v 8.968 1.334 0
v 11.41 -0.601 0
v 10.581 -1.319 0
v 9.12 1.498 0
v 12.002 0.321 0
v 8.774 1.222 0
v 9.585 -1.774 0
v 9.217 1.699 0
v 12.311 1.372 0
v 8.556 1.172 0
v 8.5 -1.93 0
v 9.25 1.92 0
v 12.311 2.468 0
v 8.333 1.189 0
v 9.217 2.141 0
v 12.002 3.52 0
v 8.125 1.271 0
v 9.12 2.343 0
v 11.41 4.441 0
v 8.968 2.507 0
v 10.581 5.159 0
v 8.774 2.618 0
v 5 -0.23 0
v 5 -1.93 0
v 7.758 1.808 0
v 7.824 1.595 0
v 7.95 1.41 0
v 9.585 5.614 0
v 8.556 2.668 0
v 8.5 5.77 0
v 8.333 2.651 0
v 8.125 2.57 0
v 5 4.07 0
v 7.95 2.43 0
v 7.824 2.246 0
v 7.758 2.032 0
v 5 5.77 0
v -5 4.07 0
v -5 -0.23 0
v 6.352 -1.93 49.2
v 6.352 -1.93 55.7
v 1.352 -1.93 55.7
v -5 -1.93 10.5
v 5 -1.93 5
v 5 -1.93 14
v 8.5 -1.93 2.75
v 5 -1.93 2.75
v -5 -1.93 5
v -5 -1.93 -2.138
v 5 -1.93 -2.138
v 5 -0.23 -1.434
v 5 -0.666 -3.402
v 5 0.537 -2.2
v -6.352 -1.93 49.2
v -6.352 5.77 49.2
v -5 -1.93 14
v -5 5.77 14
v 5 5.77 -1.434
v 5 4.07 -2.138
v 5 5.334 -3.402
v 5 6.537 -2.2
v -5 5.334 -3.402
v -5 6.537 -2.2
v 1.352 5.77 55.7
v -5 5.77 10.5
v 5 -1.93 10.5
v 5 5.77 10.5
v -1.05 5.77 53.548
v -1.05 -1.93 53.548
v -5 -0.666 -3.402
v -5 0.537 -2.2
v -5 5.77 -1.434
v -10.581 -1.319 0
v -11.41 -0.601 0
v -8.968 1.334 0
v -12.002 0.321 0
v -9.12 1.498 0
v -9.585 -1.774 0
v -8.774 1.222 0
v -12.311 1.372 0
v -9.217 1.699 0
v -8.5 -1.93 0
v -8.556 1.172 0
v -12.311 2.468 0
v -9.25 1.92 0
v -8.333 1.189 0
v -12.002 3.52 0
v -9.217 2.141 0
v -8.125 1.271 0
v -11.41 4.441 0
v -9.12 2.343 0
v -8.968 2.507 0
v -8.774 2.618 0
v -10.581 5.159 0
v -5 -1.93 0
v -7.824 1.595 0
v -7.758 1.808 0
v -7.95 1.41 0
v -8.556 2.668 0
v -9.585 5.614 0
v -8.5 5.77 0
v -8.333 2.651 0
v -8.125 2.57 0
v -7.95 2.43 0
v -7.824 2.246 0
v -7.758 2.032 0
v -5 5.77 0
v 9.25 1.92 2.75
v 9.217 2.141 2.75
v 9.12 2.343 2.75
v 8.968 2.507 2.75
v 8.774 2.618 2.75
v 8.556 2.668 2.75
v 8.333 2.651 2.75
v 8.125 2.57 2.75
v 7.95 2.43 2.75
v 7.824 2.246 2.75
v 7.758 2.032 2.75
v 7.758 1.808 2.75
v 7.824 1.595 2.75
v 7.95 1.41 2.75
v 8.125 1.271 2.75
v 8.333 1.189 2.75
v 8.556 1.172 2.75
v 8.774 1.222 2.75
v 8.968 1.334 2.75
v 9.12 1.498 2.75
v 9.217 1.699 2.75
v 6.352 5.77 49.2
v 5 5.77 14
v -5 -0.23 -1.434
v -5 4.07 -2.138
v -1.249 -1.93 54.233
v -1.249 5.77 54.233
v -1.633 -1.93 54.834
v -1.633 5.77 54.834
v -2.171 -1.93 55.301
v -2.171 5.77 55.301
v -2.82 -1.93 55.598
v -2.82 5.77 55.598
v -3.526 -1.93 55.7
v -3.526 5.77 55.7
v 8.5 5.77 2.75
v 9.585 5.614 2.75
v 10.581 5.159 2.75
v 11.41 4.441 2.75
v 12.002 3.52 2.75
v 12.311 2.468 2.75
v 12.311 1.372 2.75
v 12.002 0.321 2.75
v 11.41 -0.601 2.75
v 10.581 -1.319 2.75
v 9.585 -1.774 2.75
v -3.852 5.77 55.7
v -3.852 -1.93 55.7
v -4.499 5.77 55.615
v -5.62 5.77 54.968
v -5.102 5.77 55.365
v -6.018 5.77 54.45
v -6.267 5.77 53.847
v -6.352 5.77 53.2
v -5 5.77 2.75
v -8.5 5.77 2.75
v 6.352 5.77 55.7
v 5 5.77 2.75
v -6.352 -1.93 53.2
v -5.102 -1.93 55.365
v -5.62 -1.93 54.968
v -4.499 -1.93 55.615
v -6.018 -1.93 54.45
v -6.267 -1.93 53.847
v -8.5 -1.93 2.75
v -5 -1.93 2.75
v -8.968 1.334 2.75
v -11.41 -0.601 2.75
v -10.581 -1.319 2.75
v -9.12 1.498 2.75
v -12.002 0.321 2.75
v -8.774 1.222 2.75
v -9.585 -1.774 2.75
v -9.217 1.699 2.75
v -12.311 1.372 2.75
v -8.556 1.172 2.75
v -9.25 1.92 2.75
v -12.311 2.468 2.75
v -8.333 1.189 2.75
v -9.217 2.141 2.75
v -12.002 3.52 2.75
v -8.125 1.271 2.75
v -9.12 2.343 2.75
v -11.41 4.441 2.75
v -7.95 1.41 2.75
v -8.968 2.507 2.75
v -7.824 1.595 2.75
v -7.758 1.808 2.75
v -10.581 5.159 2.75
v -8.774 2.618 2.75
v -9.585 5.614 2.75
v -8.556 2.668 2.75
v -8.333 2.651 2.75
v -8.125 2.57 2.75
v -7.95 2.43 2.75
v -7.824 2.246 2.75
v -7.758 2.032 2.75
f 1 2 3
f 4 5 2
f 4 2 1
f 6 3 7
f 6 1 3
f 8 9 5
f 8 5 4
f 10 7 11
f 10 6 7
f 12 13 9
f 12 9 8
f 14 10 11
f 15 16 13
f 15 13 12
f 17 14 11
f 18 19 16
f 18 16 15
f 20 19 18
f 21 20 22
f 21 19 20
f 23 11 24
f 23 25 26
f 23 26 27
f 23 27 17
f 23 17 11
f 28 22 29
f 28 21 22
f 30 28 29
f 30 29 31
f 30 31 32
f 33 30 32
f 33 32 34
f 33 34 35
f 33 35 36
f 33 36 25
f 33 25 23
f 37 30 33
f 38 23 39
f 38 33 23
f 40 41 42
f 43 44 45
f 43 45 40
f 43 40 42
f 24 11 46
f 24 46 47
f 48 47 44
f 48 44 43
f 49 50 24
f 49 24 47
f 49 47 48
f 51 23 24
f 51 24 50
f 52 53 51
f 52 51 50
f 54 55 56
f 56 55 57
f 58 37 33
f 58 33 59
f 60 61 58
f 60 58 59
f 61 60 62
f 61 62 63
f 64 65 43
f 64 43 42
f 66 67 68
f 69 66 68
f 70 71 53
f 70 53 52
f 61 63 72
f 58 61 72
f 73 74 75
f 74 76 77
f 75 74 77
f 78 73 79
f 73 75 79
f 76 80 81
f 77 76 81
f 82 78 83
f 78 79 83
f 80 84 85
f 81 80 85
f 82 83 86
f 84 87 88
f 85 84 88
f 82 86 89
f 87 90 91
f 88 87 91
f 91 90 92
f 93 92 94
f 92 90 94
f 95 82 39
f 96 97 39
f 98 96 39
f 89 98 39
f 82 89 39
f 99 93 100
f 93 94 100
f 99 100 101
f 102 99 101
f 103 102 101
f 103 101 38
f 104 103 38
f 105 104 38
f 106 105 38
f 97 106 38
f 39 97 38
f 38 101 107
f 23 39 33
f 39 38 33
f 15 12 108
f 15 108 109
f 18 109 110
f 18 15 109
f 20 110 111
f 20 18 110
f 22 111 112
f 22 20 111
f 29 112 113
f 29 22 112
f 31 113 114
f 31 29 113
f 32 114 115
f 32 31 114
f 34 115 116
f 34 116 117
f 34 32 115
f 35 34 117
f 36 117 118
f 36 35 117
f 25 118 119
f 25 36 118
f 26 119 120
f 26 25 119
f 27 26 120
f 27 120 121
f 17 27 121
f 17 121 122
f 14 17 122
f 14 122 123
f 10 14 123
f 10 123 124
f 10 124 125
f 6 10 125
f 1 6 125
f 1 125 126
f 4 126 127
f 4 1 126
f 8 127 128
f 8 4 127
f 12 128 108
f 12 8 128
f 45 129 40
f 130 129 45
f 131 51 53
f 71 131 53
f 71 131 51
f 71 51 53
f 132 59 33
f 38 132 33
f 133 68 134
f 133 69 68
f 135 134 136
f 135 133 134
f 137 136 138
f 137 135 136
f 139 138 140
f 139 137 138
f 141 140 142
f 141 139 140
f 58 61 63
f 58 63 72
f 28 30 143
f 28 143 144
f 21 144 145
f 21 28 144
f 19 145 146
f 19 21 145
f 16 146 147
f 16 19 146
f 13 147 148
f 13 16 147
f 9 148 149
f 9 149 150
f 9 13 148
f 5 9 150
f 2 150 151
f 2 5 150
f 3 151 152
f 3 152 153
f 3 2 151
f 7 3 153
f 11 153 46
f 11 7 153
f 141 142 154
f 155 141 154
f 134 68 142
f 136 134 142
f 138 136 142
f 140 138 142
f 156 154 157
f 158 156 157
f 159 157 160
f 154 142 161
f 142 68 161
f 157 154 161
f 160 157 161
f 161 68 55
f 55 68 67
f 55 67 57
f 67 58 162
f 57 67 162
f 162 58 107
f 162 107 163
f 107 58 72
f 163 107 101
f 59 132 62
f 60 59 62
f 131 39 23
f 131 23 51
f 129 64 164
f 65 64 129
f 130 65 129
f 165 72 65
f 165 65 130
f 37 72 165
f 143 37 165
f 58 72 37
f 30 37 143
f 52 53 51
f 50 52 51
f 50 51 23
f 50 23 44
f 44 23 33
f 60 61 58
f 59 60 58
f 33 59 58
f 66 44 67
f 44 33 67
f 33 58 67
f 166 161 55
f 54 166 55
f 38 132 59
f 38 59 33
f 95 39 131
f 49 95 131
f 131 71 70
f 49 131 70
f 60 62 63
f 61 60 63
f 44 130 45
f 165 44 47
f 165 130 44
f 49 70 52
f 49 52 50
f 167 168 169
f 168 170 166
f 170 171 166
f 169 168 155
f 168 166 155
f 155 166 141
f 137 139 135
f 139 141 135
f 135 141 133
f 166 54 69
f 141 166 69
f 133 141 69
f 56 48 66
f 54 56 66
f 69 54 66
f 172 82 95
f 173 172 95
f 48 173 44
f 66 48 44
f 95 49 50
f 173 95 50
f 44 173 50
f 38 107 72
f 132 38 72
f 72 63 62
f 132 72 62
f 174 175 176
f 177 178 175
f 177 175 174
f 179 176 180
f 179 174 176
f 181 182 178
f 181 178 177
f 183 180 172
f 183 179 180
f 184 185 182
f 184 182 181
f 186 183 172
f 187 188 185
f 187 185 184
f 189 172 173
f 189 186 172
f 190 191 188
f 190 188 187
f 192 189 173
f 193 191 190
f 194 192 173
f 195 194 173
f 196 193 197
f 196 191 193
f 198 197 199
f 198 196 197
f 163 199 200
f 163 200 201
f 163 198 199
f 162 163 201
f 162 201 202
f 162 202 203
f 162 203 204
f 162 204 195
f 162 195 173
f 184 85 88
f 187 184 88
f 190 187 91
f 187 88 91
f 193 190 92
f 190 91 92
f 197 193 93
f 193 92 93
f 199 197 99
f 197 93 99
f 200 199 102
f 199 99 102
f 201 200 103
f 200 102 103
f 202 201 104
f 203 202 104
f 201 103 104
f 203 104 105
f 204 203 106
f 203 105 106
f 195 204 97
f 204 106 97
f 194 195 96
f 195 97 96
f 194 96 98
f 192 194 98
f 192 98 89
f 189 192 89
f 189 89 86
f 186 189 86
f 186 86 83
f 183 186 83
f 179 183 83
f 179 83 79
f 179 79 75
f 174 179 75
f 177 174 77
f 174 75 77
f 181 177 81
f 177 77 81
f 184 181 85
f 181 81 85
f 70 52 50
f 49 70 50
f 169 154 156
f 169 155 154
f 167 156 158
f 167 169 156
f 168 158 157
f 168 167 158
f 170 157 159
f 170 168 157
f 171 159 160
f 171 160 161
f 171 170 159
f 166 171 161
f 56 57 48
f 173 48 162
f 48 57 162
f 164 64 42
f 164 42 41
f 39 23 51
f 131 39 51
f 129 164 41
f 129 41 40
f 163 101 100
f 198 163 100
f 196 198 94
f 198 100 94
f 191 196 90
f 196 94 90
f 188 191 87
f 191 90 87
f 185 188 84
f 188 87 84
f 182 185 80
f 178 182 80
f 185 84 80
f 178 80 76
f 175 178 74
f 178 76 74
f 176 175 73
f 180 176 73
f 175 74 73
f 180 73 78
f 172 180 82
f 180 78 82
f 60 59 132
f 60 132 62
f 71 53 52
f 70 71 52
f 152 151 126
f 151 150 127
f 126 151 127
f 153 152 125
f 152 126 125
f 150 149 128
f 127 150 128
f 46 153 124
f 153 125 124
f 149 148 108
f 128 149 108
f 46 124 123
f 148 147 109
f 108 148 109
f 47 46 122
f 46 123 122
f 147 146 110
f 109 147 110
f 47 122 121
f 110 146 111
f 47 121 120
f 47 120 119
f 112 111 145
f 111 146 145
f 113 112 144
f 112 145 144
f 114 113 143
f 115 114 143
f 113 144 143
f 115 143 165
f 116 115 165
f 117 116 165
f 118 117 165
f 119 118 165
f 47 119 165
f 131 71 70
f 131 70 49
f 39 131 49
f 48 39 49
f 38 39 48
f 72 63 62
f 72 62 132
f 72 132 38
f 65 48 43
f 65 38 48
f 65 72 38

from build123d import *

# Parameters (mm, degrees)
SKETCH2_W           = 10
SKETCH2_H           = 14.768412439
BOSS_EXTRUDE1_DEPTH = 5
BOSS_EXTRUDE4_DEPTH = 10
SKETCH9_W           = 10
SKETCH9_H           = 3.18
SKETCH9_H_2         = 3.888412439
CUT_EXTRUDE3_DEPTH  = 5
BOSS_EXTRUDE5_DEPTH = 7.7
SKETCH12_R          = 0.75
BOSS_EXTRUDE7_DEPTH = 2.75
FILLET1_R           = 2.5


with BuildPart() as part:
    # Sketch2 → Boss-Extrude1 (new body)
    with BuildSketch(Plane.XY):
        with Locations((0, 1.566049366)):
            Rectangle(SKETCH2_W, SKETCH2_H)
    extrude(amount=BOSS_EXTRUDE1_DEPTH)

    # Sketch8 → Boss-Extrude4 (add)
    with BuildSketch(Plane.ZY.offset(5)):
        Polygon((-0.15, 5.770255585), (0, 5.770255585), (0, 4.070255585), (-0.15, 4.070255585), (-2.137867966, 4.070255585), (-3.402081528, 5.334469147), (-2.2, 6.536550675), (-1.43370491, 5.770255585), align=None)
        Polygon((-0.15, -1.929744415), (0, -1.929744415), (0, -0.229744415), (-0.15, -0.229744415), (-1.43370491, -0.229744415), (-2.2, 0.536550675), (-3.402081528, -0.665530853), (-2.137867966, -1.929744415), align=None)
    extrude(amount=-BOSS_EXTRUDE4_DEPTH)

    # Sketch9 → Cut-Extrude3 (cut)
    with BuildSketch(Plane(origin=(0, 0, 0), x_dir=(-1, 0, 0), z_dir=(0, 0, -1))):
        with Locations((0, 7.360255585)):
            Rectangle(SKETCH9_W, SKETCH9_H)
        with Locations((0, -3.873950635)):
            Rectangle(SKETCH9_W, SKETCH9_H_2)
    extrude(amount=-CUT_EXTRUDE3_DEPTH, mode=Mode.SUBTRACT)

    # Sketch10 → Boss-Extrude5 (add)
    with BuildSketch(Plane(origin=(0, 5.770255585, 0), x_dir=(1, 0, 0), z_dir=(0, 1, 0))):
        Polygon((-5, -5), (-5, -10.5), (1.352445729, -55.7), (6.352445729, -55.7), (6.352445729, -49.2), (5, -14), (5, -5), align=None)
    extrude(amount=-BOSS_EXTRUDE5_DEPTH)

    # Sketch12 → Boss-Extrude7 (add)
    with BuildSketch(Plane.XY):
        with BuildLine():
            Line((5, 5.770255585), (8.5, 5.770255585))
            ThreePointArc((8.5, 5.770255585), (12.35, 1.920255585), (8.5, -1.929744415))
            Line((8.5, -1.929744415), (5, -1.929744415))
            Line((5, -1.929744415), (5, 5.770255585))
        make_face()
        with Locations((8.5, 1.920255585)):
            Circle(SKETCH12_R, mode=Mode.SUBTRACT)
    extrude(amount=BOSS_EXTRUDE7_DEPTH)


with BuildPart() as body_2:
    # Mirror1: mirrored copy
    add(part.part.mirror(Plane(origin=(0, 0, 0), x_dir=(0, 0, 1), z_dir=(1, 0, 0))))

    # Fillet1
    fillet1_edges = [body_2.edges().sort_by_distance(p)[0] for p in [
        (-6.352445729, 1.920255585, 49.2),
        (-5, 1.920255585, 14),
        (-1.352445729, 1.920255585, 55.7),
        (-6.352445729, 1.920255585, 55.7),
    ]]
    fillet(fillet1_edges, radius=FILLET1_R)


solid = Compound([part.part, body_2.part])
